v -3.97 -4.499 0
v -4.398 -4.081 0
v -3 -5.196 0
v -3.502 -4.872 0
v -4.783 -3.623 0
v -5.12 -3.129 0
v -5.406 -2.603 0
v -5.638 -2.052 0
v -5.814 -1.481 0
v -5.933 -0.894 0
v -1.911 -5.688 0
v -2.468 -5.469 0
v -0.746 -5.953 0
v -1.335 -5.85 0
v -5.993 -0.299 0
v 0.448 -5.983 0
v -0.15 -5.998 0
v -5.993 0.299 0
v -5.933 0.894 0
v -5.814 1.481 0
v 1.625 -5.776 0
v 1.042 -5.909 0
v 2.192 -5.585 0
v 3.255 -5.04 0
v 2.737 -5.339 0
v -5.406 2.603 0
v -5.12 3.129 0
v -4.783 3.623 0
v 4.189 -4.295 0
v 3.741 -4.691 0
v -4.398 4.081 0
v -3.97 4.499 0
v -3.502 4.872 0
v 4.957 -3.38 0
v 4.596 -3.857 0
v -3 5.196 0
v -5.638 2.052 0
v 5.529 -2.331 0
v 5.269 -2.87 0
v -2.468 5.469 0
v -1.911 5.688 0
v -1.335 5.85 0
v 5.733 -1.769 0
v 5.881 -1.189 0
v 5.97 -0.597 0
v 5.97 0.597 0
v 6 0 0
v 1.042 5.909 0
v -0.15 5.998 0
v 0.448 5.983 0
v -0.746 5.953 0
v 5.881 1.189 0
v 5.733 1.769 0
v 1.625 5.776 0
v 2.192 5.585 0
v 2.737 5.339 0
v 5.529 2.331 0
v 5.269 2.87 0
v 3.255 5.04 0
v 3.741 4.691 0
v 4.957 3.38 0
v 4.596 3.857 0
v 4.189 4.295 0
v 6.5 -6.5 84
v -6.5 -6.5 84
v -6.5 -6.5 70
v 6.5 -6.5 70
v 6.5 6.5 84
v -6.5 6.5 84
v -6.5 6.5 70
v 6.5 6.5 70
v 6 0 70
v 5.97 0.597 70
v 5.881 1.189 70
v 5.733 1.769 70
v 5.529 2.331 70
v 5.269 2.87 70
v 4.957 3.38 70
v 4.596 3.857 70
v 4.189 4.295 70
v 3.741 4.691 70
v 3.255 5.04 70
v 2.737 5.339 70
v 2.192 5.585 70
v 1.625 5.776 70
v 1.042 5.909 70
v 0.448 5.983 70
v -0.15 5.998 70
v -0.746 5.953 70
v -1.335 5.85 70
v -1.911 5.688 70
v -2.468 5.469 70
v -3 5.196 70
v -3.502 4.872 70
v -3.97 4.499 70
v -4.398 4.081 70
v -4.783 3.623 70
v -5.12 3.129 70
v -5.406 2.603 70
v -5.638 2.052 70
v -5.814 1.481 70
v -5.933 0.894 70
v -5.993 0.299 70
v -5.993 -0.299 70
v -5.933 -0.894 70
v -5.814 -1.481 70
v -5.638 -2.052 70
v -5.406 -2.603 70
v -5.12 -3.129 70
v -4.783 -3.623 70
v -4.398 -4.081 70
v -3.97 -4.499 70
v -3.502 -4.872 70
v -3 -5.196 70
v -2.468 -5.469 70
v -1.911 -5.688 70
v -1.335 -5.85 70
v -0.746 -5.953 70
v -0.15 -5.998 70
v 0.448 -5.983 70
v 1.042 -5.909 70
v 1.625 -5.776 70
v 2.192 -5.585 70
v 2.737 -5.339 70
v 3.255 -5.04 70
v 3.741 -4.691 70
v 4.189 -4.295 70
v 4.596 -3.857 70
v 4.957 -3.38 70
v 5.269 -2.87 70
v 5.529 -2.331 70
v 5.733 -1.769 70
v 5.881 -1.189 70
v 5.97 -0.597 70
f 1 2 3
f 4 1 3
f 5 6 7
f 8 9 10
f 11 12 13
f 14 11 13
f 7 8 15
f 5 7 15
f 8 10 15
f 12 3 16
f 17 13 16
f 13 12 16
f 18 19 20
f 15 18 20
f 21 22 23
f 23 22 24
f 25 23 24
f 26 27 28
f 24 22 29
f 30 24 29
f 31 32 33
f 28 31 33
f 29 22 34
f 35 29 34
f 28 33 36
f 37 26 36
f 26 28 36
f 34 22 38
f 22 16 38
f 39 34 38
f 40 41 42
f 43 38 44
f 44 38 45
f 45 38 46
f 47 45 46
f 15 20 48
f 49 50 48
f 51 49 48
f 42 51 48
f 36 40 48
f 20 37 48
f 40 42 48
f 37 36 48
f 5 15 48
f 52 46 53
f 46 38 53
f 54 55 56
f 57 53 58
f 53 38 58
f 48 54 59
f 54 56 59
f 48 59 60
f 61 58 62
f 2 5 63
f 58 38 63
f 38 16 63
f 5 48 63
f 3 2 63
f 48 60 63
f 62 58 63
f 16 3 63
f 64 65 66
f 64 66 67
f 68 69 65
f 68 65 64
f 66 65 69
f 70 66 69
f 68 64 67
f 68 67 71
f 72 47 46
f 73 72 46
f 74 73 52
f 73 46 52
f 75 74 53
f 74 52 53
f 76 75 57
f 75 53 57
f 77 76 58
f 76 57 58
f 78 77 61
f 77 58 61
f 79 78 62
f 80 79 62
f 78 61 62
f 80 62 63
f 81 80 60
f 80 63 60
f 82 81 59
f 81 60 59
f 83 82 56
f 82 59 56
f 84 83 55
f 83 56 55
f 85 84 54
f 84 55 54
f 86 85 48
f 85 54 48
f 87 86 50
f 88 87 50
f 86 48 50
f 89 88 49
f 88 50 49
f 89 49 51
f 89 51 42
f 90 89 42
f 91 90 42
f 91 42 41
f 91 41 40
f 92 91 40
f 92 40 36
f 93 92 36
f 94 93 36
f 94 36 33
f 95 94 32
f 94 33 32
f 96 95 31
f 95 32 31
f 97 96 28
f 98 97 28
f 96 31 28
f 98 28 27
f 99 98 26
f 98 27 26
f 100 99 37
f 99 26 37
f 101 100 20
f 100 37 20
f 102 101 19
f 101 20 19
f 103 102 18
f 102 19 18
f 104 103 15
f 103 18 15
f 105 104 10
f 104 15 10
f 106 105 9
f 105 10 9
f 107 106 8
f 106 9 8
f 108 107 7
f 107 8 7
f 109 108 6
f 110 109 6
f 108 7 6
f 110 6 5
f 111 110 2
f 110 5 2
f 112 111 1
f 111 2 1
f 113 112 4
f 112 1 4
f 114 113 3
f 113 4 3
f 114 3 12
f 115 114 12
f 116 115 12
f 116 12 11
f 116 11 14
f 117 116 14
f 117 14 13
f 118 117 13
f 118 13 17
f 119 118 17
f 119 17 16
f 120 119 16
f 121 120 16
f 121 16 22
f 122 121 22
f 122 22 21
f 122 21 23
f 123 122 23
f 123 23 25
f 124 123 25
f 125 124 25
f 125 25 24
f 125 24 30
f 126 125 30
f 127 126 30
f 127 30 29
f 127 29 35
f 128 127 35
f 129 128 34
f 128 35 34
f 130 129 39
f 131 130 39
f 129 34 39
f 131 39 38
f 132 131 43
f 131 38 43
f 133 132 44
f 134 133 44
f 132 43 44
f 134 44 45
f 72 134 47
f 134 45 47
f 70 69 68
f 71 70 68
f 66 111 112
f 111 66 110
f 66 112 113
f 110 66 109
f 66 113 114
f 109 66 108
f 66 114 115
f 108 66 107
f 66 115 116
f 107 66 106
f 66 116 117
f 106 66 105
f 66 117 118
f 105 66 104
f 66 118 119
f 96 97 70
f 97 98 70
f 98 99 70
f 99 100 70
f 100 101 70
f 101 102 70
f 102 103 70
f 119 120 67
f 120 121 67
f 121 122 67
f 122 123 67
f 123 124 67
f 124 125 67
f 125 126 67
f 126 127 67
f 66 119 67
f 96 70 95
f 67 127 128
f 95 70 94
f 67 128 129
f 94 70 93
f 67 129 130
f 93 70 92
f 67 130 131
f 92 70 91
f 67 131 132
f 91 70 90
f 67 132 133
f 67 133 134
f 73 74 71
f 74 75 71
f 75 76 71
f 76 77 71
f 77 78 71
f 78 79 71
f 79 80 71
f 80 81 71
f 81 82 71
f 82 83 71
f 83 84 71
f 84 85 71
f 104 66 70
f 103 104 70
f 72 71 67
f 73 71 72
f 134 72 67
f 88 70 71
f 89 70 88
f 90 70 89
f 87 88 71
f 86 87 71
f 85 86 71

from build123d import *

# Parameters (mm, degrees)
SKETCH1_R           = 6
BOSS_EXTRUDE1_DEPTH = 70
SKETCH2_W           = 13
SKETCH2_H           = 13
BOSS_EXTRUDE2_DEPTH = 14


with BuildPart() as part:
    # Sketch1 → Boss-Extrude1 (new body)
    with BuildSketch(Plane.XY):
        Circle(SKETCH1_R)
    extrude(amount=BOSS_EXTRUDE1_DEPTH)

    # Sketch2 → Boss-Extrude2 (add)
    with BuildSketch(Plane.XY.offset(84)):
        Rectangle(SKETCH2_W, SKETCH2_H)
    extrude(amount=-BOSS_EXTRUDE2_DEPTH)


solid = part.part
